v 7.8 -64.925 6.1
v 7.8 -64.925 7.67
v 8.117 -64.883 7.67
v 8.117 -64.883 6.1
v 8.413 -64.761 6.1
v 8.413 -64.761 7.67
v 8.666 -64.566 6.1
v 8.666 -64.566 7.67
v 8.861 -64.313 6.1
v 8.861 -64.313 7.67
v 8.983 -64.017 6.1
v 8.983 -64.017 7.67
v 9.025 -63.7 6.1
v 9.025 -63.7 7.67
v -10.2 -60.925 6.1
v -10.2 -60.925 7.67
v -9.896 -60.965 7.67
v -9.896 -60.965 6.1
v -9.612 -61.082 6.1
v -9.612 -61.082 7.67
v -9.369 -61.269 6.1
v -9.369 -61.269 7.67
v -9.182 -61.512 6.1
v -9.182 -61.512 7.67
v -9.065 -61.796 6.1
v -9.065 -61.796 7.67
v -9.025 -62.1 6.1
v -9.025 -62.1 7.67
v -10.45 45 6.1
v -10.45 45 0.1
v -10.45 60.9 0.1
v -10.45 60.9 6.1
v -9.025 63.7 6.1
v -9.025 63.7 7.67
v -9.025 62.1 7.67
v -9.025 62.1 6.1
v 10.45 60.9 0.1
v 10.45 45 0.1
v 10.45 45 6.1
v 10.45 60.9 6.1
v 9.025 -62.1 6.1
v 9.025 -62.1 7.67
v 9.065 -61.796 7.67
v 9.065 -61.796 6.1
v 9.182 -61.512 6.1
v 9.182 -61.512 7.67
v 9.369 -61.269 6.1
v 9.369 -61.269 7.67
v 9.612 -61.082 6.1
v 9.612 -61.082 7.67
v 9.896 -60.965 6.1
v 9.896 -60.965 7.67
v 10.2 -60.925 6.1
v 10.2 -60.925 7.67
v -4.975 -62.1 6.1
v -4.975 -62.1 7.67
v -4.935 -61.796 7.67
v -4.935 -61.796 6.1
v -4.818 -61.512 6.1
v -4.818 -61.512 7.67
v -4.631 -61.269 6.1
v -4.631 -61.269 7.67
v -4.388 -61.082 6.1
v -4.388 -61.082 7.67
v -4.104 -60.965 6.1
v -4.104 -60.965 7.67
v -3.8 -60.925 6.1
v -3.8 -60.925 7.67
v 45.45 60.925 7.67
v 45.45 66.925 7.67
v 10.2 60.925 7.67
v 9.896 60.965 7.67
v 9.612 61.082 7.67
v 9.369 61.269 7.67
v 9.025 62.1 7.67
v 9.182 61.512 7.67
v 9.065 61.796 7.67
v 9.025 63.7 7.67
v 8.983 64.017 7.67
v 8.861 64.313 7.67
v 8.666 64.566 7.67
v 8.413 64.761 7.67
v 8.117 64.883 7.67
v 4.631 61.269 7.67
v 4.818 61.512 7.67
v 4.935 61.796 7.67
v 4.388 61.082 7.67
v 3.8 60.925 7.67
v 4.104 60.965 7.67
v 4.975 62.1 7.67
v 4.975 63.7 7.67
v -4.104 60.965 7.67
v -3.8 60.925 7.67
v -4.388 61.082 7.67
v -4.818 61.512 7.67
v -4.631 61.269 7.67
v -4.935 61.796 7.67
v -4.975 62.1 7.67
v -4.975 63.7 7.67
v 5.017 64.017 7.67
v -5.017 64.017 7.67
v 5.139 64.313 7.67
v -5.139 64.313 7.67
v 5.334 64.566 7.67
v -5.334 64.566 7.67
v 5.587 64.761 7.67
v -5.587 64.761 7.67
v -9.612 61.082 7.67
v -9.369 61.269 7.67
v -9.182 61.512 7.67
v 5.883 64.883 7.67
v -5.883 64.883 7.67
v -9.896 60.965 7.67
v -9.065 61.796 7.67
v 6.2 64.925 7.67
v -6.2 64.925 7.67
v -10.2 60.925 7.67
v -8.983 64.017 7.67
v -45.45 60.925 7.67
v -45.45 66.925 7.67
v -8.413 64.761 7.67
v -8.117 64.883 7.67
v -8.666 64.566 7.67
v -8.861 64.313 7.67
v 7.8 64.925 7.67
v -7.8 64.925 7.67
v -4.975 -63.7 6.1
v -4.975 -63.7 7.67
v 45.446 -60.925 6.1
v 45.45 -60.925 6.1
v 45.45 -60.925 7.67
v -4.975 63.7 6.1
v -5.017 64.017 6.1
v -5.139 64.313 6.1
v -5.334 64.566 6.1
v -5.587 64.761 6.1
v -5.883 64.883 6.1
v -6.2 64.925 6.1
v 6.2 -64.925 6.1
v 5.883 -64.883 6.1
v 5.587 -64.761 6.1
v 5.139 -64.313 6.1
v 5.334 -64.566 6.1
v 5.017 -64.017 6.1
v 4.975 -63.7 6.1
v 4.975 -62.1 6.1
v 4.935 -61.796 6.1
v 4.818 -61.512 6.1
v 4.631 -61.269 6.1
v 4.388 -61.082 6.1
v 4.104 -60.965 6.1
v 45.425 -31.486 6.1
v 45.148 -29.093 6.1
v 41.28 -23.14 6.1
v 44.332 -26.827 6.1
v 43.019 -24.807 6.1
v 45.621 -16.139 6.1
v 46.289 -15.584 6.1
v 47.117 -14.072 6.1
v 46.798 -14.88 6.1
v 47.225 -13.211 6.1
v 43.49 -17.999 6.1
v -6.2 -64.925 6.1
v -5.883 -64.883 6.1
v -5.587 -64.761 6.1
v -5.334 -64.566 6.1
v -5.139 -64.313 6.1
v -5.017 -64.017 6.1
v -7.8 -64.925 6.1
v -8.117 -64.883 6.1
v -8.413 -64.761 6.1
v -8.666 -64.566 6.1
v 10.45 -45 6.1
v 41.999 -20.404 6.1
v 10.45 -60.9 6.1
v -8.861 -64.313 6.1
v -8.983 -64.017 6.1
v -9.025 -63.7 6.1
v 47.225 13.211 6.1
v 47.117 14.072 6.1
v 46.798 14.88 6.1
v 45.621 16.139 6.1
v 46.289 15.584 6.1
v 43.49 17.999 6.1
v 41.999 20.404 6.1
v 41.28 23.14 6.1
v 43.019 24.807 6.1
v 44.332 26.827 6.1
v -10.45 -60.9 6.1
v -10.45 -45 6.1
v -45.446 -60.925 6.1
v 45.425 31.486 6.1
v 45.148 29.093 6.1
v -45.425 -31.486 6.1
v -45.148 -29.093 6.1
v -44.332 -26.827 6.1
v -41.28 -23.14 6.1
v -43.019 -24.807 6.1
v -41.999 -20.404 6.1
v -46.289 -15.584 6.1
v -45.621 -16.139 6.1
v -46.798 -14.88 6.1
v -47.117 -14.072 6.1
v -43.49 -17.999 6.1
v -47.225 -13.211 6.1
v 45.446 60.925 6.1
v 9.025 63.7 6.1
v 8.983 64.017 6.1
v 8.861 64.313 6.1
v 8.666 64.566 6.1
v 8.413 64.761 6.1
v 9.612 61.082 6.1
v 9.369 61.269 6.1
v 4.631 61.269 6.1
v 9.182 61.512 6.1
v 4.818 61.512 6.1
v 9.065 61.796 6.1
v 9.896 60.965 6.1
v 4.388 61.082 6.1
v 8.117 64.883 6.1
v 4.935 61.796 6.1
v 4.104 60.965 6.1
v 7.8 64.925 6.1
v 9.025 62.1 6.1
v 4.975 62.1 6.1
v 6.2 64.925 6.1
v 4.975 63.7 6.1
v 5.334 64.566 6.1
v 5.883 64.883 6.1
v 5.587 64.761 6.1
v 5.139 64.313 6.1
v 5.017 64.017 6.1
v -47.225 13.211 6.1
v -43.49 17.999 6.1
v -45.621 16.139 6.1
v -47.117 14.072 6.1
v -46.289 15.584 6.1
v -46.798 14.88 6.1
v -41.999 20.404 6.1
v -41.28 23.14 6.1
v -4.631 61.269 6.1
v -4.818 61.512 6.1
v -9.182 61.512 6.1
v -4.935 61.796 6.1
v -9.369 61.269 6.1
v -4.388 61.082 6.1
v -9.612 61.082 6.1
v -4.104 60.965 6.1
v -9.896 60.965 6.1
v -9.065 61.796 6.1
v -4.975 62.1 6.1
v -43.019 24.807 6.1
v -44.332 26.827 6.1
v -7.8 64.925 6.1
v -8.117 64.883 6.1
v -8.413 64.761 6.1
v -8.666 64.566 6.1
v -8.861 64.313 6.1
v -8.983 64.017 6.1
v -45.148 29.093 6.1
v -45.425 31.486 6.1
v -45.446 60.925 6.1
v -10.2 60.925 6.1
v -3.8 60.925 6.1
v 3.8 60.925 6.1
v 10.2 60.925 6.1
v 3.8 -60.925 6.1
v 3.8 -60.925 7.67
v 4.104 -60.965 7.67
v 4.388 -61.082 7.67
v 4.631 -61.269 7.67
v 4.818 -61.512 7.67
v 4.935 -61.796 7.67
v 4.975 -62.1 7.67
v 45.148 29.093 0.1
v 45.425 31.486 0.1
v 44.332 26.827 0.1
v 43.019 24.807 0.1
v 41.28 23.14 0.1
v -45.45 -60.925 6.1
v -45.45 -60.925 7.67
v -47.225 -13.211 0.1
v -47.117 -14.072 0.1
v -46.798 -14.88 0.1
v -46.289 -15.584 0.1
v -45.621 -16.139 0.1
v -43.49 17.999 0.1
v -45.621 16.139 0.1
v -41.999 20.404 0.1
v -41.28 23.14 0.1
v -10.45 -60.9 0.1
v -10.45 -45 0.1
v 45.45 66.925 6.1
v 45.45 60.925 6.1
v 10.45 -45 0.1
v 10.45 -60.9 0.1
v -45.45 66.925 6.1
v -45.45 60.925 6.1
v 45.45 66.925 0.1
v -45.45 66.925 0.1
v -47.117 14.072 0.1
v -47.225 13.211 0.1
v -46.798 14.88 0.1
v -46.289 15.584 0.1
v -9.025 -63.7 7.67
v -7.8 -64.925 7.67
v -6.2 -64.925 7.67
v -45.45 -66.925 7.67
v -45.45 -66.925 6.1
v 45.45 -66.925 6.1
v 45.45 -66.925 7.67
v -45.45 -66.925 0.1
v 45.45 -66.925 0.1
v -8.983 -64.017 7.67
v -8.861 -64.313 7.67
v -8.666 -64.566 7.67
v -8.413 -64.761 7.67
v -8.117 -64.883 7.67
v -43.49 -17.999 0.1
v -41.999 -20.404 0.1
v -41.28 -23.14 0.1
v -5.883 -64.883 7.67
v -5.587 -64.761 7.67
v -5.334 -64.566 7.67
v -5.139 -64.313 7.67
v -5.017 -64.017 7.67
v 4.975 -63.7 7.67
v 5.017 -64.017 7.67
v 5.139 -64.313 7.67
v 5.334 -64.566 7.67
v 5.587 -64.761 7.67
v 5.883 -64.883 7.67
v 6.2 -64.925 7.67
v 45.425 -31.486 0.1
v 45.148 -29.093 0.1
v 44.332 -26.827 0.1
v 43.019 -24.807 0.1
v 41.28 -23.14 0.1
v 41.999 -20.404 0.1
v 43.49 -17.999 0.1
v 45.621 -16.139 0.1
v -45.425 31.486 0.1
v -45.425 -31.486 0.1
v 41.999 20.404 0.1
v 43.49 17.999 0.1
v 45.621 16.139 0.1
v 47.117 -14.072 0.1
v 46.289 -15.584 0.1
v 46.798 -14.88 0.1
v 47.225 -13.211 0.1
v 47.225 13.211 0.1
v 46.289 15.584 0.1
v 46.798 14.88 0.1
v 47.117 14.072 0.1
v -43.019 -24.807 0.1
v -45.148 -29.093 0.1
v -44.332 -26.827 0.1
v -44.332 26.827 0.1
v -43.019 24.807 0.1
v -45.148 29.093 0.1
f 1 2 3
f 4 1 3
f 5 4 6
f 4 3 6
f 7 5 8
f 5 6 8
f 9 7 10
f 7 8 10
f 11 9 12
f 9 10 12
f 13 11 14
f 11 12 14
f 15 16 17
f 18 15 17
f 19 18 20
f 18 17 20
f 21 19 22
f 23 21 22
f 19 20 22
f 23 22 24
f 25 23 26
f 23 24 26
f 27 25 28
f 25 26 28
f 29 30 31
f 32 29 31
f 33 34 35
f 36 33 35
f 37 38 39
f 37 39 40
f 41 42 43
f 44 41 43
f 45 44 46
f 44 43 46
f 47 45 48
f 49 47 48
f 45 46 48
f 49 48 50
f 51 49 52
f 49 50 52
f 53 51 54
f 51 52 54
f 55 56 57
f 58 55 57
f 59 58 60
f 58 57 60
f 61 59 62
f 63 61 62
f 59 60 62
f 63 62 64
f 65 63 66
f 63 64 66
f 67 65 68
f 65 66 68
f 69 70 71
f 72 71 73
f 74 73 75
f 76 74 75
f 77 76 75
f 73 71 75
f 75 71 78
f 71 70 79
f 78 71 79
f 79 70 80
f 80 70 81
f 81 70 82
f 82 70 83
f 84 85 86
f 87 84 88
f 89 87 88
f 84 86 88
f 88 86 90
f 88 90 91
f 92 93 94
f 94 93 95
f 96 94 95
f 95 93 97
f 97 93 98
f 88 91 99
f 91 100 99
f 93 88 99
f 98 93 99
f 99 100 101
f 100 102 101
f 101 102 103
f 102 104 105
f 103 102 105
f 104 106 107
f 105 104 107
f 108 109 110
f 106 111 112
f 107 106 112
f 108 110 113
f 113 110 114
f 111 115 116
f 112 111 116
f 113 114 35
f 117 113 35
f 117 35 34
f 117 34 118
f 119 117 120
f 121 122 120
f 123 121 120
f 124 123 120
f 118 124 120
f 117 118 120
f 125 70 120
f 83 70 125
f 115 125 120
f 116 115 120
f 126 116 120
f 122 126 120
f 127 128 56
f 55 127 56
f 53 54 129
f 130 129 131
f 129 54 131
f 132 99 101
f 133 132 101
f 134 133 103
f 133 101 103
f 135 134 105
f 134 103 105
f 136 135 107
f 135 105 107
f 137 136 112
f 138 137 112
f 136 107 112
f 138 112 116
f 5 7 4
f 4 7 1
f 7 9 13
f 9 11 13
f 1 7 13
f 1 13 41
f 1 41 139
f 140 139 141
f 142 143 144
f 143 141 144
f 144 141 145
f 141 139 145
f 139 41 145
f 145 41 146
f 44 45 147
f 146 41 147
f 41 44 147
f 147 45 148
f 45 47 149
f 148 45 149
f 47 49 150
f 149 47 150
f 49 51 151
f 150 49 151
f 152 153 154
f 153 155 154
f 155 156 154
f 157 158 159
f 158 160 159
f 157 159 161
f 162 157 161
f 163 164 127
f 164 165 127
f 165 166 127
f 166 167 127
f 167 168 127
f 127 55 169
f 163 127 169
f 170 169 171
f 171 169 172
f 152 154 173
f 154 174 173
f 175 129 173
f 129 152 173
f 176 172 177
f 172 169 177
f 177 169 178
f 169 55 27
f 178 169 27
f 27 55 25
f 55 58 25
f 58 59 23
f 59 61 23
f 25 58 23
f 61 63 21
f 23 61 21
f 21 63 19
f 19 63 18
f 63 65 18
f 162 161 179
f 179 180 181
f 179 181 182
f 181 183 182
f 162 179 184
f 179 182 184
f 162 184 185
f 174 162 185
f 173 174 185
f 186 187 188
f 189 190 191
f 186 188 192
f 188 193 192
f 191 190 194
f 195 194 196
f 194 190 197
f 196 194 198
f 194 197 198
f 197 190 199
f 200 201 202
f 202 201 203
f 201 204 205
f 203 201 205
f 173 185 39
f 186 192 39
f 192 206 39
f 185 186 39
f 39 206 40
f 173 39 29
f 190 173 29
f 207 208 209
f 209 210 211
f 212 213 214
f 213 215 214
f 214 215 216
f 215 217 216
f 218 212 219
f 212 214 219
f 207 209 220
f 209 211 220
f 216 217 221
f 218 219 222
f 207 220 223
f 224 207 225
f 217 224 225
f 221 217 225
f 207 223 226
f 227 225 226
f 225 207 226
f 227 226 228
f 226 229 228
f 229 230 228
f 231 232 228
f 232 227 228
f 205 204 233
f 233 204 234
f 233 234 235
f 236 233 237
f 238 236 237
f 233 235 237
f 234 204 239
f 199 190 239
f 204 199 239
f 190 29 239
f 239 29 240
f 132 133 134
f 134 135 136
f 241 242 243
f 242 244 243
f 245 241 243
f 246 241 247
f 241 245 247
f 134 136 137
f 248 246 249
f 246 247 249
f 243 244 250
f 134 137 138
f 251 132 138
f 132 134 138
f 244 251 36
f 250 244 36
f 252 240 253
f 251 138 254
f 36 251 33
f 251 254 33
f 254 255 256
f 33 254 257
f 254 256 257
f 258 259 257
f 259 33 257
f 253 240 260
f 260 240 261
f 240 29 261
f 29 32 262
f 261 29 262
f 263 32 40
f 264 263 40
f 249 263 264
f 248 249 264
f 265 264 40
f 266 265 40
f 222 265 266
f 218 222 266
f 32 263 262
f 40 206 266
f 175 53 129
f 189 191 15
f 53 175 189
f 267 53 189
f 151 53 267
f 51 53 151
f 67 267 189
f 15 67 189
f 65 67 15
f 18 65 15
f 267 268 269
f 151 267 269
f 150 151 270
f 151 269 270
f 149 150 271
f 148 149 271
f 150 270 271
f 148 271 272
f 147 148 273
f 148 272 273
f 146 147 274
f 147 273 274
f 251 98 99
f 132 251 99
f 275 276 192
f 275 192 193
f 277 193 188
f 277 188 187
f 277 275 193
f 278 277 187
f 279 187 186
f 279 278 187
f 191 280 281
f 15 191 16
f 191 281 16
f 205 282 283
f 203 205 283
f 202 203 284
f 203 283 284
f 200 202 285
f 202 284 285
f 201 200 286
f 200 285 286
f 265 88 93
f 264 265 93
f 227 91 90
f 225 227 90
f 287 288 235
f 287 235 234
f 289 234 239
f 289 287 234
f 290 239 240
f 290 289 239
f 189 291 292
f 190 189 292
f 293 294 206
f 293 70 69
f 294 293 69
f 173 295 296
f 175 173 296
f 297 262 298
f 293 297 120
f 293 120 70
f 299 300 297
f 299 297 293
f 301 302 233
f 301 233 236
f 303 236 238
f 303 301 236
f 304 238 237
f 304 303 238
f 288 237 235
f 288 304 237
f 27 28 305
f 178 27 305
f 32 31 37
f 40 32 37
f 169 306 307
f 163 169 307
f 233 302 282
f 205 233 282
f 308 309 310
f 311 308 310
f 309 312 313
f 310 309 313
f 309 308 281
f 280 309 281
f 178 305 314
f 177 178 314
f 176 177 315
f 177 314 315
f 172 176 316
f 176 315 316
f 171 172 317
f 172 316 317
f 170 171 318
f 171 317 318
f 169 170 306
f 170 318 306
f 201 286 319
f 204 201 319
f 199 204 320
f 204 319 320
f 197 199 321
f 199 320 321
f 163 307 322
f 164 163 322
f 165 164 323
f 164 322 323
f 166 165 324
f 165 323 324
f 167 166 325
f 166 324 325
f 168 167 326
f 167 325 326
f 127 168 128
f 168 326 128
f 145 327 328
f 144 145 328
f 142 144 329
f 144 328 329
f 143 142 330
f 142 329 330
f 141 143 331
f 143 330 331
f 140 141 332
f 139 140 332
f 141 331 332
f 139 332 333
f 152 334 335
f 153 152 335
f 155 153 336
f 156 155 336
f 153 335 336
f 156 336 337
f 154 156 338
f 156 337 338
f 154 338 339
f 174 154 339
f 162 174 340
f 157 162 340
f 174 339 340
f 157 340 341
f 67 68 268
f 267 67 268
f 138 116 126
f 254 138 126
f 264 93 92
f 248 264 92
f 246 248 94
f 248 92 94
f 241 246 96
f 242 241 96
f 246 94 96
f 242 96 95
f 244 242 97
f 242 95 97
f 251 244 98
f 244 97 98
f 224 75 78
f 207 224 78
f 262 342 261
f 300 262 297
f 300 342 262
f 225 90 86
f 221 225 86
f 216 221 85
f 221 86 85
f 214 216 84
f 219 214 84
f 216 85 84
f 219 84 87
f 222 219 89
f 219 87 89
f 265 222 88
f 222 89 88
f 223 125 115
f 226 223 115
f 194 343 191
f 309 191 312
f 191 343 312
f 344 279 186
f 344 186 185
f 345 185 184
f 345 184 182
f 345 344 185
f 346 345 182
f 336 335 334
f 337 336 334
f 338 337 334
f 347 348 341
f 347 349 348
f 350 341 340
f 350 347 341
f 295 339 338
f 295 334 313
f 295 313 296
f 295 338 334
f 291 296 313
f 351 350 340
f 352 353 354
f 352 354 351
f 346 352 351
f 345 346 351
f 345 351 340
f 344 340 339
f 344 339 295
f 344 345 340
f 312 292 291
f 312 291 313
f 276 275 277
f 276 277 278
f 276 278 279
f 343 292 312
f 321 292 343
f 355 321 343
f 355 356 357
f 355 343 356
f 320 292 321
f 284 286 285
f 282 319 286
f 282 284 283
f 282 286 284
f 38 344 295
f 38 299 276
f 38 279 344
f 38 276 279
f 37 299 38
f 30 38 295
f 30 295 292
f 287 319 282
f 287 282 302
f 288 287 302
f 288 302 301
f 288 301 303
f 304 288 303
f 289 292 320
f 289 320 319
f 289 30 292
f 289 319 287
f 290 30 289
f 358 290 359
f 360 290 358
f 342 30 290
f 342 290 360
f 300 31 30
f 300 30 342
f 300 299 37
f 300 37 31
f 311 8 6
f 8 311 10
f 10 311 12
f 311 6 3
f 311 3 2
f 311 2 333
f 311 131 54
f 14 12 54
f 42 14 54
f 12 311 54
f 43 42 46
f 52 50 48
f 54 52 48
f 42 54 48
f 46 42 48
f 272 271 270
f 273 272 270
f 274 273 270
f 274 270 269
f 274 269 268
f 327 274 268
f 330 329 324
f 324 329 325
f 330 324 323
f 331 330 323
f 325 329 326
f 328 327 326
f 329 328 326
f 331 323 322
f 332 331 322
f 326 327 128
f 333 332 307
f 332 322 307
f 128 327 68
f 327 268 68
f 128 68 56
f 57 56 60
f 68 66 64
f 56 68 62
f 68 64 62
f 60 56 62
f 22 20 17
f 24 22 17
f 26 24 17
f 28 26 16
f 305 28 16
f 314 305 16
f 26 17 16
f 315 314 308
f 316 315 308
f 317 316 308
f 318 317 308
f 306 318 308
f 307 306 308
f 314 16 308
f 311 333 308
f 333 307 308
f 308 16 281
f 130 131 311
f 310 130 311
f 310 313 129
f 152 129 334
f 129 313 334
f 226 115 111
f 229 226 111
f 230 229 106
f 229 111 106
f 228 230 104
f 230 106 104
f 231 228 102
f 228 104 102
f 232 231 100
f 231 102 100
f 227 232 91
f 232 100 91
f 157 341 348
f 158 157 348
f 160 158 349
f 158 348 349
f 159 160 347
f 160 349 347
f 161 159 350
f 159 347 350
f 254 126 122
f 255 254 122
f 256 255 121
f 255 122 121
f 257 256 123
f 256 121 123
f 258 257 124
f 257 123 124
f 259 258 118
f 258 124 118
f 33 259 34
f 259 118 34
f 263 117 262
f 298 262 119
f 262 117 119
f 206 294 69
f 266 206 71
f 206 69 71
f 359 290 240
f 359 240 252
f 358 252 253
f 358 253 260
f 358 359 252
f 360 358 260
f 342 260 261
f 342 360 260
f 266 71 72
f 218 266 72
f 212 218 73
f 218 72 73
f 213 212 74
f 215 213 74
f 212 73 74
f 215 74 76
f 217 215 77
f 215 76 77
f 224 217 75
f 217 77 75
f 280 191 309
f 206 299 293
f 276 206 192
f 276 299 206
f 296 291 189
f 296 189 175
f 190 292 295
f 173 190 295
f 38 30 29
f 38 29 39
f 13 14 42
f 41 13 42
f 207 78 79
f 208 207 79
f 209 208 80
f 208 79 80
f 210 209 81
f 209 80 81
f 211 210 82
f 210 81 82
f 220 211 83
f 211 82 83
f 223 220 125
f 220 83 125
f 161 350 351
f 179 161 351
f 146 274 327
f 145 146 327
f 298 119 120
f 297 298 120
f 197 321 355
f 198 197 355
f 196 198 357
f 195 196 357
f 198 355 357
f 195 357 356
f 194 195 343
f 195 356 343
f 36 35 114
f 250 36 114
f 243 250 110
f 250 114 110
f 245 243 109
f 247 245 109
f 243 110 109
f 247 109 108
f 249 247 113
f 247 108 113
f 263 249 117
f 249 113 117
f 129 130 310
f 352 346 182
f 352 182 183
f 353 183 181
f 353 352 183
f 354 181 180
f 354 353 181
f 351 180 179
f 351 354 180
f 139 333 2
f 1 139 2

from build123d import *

# Parameters (mm, degrees)
BOSS_EXTRUDE1_DEPTH   = 1.57
BOSS_EXTRUDE1_2_DEPTH = 1.57
SKETCH2_W             = 20.9
SKETCH2_H             = 15.9
SKETCH2_W_2           = 94.45
SKETCH2_H_2           = 0.025
SKETCH2_H_3           = 6.025
BOSS_EXTRUDE3_DEPTH   = 6


with BuildPart() as part:
    # Sketch1 → Boss-Extrude1 (new body)
    with BuildSketch(Plane.XY.offset(7.67)):
        with BuildLine():
            Line((-10.2, 60.925), (-45.45, 60.925))
            Line((-45.45, 60.925), (-45.45, 66.925))
            Line((-45.45, 66.925), (45.45, 66.925))
            Line((45.45, 66.925), (45.45, 60.925))
            Line((45.45, 60.925), (10.2, 60.925))
            ThreePointArc((10.2, 60.925), (9.369149532, 61.269149532), (9.025, 62.1))
            Line((9.025, 62.1), (9.025, 63.7))
            ThreePointArc((9.025, 63.7), (8.666205807, 64.566205807), (7.8, 64.925))
            Line((7.8, 64.925), (6.2, 64.925))
            ThreePointArc((6.2, 64.925), (5.333794193, 64.566205807), (4.975, 63.7))
            Line((4.975, 63.7), (4.975, 62.1))
            ThreePointArc((4.975, 62.1), (4.630850468, 61.269149532), (3.8, 60.925))
            Line((3.8, 60.925), (-3.8, 60.925))
            ThreePointArc((-3.8, 60.925), (-4.630850468, 61.269149532), (-4.975, 62.1))
            Line((-4.975, 62.1), (-4.975, 63.7))
            ThreePointArc((-4.975, 63.7), (-5.333794193, 64.566205807), (-6.2, 64.925))
            Line((-6.2, 64.925), (-7.8, 64.925))
            ThreePointArc((-7.8, 64.925), (-8.666205807, 64.566205807), (-9.025, 63.7))
            Line((-9.025, 63.7), (-9.025, 62.1))
            ThreePointArc((-9.025, 62.1), (-9.369149532, 61.269149532), (-10.2, 60.925))
        make_face()
    extrude(amount=-BOSS_EXTRUDE1_DEPTH)



with BuildPart() as body_2:
    # Sketch1 → Boss-Extrude1 2 (new body)
    with BuildSketch(Plane.XY.offset(7.67)):
        with BuildLine():
            Line((10.2, -60.925), (45.45, -60.925))
            Line((45.45, -60.925), (45.45, -66.925))
            Line((45.45, -66.925), (-45.45, -66.925))
            Line((-45.45, -66.925), (-45.45, -60.925))
            Line((-45.45, -60.925), (-10.2, -60.925))
            ThreePointArc((-10.2, -60.925), (-9.369149532, -61.269149532), (-9.025, -62.1))
            Line((-9.025, -62.1), (-9.025, -63.7))
            ThreePointArc((-9.025, -63.7), (-8.666205807, -64.566205807), (-7.8, -64.925))
            Line((-7.8, -64.925), (-6.2, -64.925))
            ThreePointArc((-6.2, -64.925), (-5.333794193, -64.566205807), (-4.975, -63.7))
            Line((-4.975, -63.7), (-4.975, -62.1))
            ThreePointArc((-4.975, -62.1), (-4.630850468, -61.269149532), (-3.8, -60.925))
            Line((-3.8, -60.925), (3.8, -60.925))
            ThreePointArc((3.8, -60.925), (4.630850468, -61.269149532), (4.975, -62.1))
            Line((4.975, -62.1), (4.975, -63.7))
            ThreePointArc((4.975, -63.7), (5.333794193, -64.566205807), (6.2, -64.925))
            Line((6.2, -64.925), (7.8, -64.925))
            ThreePointArc((7.8, -64.925), (8.666205807, -64.566205807), (9.025, -63.7))
            Line((9.025, -63.7), (9.025, -62.1))
            ThreePointArc((9.025, -62.1), (9.369149532, -61.269149532), (10.2, -60.925))
        make_face()
    extrude(amount=-BOSS_EXTRUDE1_2_DEPTH)


with BuildPart() as part_1:
    add(part.part)

    add(body_2.part)  # Boss-Extrude3 merges body 2
    # Sketch2 → Boss-Extrude3 (add)
    with BuildSketch(Plane.XY.offset(0.1)):
        with BuildLine():
            ThreePointArc((-45.621153846, 16.138909297), (-42.65479168, 19.145865857), (-41.280343138, 23.139859279))
            ThreePointArc((-41.280343138, 23.139859279), (-44.331790058, 26.826513587), (-45.425, 31.485659466))
            Line((-45.425, 31.485659466), (-45.45, 66.925))
            Line((-45.45, 66.925), (45.45, 66.925))
            Line((45.45, 66.925), (45.425, 31.485659466))
            ThreePointArc((45.425, 31.485659466), (44.331790058, 26.826513587), (41.280343138, 23.139859279))
            ThreePointArc((41.280343138, 23.139859279), (42.65479168, 19.145865857), (45.621153846, 16.138909297))
            ThreePointArc((45.621153846, 16.138909297), (46.797776617, 14.880036243), (47.225, 13.21070024))
            Line((47.225, 13.21070024), (47.225, 0.025))
            Line((47.225, 0.025), (-47.225, 0.025))
            Line((-47.225, 0.025), (-47.225, 13.21070024))
            ThreePointArc((-47.225, 13.21070024), (-46.797776617, 14.880036243), (-45.621153846, 16.138909297))
        make_face()
        with Locations((0, 52.95)):
            Rectangle(SKETCH2_W, SKETCH2_H, mode=Mode.SUBTRACT)
        with Locations((0, 0.0125)):
            Rectangle(SKETCH2_W_2, SKETCH2_H_2)
        with Locations((0, -0.0125)):
            Rectangle(SKETCH2_W_2, SKETCH2_H_2)
        with BuildLine():
            Line((-47.225, -0.025), (-47.225, -13.21070024))
            ThreePointArc((-47.225, -13.21070024), (-46.797776617, -14.880036243), (-45.621153846, -16.138909297))
            ThreePointArc((-45.621153846, -16.138909297), (-42.65479168, -19.145865857), (-41.280343138, -23.139859279))
            ThreePointArc((-41.280343138, -23.139859279), (-44.331790058, -26.826513587), (-45.425, -31.485659466))
            Line((-45.425, -31.485659466), (-45.45, -66.925))
            Line((-45.45, -66.925), (-30.45, -66.925))
            Line((-30.45, -66.925), (-30.45, -45))
            Line((-30.45, -45), (-10.45, -45))
            Line((-10.45, -45), (10.45, -45))
            Line((10.45, -45), (30.45, -45))
            Line((30.45, -45), (30.45, -66.925))
            Line((30.45, -66.925), (45.45, -66.925))
            Line((45.45, -66.925), (45.425, -31.485659466))
            ThreePointArc((45.425, -31.485659466), (44.331790058, -26.826513587), (41.280343138, -23.139859279))
            ThreePointArc((41.280343138, -23.139859279), (42.65479168, -19.145865857), (45.621153846, -16.138909297))
            ThreePointArc((45.621153846, -16.138909297), (46.797776617, -14.880036243), (47.225, -13.21070024))
            Line((47.225, -13.21070024), (47.225, -0.025))
            Line((47.225, -0.025), (-47.225, -0.025))
        make_face()
        Polygon((10.45, -60.9), (10.45, -66.925), (30.45, -66.925), (30.45, -45), (10.45, -45), align=None)
        Polygon((-30.45, -45), (-30.45, -66.925), (-10.45, -66.925), (-10.45, -60.9), (-10.45, -45), align=None)
        with Locations((0, -63.9125)):
            Rectangle(SKETCH2_W, SKETCH2_H_3)
    extrude(amount=BOSS_EXTRUDE3_DEPTH)


solid = part_1.part
